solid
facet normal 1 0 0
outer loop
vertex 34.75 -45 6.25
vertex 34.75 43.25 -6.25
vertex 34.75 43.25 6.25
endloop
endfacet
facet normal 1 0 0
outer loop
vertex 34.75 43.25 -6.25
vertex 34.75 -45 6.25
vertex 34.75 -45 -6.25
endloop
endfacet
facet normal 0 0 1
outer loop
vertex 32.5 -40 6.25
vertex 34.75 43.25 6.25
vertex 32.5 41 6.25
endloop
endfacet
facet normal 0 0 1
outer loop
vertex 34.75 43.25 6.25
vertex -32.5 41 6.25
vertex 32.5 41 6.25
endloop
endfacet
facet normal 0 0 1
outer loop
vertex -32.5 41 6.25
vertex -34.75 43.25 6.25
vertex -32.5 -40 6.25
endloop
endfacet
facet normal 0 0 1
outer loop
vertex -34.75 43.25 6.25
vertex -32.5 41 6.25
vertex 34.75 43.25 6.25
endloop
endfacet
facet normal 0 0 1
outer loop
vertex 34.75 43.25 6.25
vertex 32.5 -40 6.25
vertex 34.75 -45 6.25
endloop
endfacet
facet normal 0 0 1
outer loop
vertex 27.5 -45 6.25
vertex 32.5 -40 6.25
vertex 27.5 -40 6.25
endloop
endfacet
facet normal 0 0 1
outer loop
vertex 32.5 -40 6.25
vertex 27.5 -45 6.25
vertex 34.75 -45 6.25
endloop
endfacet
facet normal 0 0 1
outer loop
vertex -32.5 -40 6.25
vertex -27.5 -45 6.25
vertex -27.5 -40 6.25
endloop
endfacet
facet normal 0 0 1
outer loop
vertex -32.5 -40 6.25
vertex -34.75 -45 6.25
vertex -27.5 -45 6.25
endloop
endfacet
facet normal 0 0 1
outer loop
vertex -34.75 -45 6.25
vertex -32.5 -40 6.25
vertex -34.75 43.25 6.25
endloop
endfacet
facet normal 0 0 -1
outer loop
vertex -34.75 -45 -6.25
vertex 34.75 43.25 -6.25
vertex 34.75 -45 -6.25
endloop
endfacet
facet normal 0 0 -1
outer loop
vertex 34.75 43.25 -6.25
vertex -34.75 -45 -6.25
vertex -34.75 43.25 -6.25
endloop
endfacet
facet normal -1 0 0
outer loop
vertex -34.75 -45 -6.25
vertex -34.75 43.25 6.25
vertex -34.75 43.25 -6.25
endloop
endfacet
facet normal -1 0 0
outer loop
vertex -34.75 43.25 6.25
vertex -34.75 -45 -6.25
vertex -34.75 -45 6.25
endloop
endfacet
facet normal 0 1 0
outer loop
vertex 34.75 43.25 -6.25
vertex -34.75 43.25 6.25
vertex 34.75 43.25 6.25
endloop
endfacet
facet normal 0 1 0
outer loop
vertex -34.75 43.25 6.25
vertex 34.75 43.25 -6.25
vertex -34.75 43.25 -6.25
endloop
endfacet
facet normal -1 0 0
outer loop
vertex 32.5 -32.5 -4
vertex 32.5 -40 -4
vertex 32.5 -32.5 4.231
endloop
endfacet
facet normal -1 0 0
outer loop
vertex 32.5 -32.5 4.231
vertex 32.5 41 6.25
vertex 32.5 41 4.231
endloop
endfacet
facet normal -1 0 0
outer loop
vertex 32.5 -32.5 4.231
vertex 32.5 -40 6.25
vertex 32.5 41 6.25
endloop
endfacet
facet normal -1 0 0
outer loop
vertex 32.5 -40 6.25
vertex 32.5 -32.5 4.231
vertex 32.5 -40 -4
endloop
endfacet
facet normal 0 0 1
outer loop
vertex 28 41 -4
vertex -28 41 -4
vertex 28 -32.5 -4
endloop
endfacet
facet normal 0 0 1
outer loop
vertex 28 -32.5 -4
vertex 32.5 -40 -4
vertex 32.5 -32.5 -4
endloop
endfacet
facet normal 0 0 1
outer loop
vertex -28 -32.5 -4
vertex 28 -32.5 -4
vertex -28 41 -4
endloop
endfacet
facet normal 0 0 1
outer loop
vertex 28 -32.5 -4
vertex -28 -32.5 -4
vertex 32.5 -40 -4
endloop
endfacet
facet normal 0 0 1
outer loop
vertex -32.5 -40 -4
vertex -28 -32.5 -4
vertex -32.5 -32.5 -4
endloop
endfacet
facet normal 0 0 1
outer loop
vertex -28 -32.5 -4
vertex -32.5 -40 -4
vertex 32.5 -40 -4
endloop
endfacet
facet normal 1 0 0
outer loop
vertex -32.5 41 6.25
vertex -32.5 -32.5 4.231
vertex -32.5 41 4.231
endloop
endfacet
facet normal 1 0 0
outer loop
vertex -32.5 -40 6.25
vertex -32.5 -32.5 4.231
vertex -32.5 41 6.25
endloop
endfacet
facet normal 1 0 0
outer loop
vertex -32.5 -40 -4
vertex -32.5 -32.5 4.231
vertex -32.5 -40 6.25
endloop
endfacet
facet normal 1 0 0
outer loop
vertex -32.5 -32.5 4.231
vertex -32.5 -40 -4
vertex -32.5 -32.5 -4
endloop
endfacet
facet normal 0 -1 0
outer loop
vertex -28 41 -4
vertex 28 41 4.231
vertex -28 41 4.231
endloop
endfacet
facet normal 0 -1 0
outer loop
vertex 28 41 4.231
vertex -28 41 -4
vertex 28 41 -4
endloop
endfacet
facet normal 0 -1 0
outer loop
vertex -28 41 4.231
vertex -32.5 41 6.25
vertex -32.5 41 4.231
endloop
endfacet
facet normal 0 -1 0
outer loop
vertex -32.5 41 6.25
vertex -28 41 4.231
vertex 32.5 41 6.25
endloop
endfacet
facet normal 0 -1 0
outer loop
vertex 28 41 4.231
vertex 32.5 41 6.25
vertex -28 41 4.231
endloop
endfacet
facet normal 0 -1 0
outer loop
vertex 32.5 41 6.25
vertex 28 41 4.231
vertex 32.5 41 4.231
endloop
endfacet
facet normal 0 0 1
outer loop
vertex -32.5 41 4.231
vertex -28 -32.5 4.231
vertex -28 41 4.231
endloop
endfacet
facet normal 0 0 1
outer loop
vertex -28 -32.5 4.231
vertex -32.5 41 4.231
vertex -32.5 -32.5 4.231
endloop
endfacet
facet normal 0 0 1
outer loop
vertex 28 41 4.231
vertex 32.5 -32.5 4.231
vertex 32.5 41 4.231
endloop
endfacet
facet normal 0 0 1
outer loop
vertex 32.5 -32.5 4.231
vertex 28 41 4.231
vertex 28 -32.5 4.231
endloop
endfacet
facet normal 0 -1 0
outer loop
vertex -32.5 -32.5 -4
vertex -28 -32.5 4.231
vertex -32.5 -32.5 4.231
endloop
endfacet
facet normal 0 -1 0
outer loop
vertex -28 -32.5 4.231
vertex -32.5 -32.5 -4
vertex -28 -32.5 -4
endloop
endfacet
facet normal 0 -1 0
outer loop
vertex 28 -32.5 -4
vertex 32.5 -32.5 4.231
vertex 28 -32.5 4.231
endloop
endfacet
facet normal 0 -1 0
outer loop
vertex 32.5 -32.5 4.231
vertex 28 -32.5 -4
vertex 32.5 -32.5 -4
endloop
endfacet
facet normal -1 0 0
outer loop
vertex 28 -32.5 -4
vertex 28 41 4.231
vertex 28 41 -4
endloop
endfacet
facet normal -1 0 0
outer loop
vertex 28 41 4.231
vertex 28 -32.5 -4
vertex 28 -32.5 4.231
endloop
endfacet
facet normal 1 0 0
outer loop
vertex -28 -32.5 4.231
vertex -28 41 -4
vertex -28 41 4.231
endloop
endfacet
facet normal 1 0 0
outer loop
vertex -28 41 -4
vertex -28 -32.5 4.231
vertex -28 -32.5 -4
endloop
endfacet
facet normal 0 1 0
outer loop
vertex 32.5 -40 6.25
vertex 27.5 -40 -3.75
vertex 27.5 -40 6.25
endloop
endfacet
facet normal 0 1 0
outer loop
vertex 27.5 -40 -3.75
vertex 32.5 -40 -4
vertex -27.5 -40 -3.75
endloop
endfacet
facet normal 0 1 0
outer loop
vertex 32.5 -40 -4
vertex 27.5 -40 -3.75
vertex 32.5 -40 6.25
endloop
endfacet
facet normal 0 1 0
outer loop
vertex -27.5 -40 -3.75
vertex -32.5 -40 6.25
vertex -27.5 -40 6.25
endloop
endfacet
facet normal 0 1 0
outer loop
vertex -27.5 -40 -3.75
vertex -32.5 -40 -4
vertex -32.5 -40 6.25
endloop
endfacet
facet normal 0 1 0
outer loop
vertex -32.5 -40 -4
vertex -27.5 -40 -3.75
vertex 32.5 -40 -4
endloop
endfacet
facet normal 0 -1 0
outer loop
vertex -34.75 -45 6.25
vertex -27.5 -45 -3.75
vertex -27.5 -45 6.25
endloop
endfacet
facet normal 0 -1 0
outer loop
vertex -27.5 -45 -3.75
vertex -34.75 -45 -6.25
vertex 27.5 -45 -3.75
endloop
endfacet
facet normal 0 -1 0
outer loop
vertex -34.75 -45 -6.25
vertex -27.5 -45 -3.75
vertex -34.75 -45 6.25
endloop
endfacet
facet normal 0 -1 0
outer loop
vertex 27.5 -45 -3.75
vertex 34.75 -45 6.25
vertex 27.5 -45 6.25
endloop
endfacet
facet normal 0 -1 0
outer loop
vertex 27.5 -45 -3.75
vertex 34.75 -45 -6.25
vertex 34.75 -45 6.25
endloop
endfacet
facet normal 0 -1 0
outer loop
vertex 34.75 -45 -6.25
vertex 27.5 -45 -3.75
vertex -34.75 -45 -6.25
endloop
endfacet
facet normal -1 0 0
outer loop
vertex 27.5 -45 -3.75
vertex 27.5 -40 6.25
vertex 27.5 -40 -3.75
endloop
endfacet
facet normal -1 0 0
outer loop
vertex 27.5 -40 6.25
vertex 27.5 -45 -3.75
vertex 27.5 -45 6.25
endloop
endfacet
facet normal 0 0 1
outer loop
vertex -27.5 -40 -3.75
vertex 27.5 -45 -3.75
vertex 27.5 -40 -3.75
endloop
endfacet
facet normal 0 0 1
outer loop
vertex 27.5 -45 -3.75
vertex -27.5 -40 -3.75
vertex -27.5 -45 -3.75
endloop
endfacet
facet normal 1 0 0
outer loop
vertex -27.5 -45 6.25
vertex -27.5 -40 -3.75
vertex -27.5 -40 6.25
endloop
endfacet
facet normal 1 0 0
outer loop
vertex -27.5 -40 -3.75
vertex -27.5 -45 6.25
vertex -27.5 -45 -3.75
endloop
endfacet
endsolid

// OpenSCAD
dimWidth=68;
dimDepth=85;
dimHeight=11;

slotWidth=55;

BorderSize=1.5;


// Create a shadow box that has a hole the size of the user port
%difference() {

	CartOut=1;
	CartPos=CartOut*15;

	SlotWidth=72;
	SlotHeight=15;
	color("Black",0.25)
	translate([0,-52+CartPos,0])
	cube(size=[SlotWidth*2,10,SlotHeight*2],center=true);
	
	translate([0,-52+CartPos,0.75])
	cube(size=[SlotWidth,20,SlotHeight],center=true);
}

//Draw the basic bottom box
difference() {
	color("Green")
	cube(size=[dimWidth+BorderSize,dimDepth+BorderSize,dimHeight+BorderSize],center=true);
	
	color("Green")
	translate([0,-BorderSize,BorderSize])
	cube(size=[dimWidth-BorderSize*2,dimDepth,dimHeight],center=true);
	
}

// Create the left and right "shelves" to screw into
difference() {
	color("Red")
	translate([0,5,0])
	cube([dimWidth,dimDepth-10,dimHeight/1.3],center=true);
	
	color("Red")
	translate([0,5,0])
	cube([56,90,100],center=true);
}

// This is the part where the connector faces out.
difference() {
	color("blue")
	translate([0,-dimDepth/2,])
	cube(size=[dimWidth+BorderSize,5,dimHeight+BorderSize],center=true);
	
	color("blue")
	translate([0,-dimDepth/2,BorderSize/2+20])
	cube(size=[slotWidth,10,49],center=true);
}
